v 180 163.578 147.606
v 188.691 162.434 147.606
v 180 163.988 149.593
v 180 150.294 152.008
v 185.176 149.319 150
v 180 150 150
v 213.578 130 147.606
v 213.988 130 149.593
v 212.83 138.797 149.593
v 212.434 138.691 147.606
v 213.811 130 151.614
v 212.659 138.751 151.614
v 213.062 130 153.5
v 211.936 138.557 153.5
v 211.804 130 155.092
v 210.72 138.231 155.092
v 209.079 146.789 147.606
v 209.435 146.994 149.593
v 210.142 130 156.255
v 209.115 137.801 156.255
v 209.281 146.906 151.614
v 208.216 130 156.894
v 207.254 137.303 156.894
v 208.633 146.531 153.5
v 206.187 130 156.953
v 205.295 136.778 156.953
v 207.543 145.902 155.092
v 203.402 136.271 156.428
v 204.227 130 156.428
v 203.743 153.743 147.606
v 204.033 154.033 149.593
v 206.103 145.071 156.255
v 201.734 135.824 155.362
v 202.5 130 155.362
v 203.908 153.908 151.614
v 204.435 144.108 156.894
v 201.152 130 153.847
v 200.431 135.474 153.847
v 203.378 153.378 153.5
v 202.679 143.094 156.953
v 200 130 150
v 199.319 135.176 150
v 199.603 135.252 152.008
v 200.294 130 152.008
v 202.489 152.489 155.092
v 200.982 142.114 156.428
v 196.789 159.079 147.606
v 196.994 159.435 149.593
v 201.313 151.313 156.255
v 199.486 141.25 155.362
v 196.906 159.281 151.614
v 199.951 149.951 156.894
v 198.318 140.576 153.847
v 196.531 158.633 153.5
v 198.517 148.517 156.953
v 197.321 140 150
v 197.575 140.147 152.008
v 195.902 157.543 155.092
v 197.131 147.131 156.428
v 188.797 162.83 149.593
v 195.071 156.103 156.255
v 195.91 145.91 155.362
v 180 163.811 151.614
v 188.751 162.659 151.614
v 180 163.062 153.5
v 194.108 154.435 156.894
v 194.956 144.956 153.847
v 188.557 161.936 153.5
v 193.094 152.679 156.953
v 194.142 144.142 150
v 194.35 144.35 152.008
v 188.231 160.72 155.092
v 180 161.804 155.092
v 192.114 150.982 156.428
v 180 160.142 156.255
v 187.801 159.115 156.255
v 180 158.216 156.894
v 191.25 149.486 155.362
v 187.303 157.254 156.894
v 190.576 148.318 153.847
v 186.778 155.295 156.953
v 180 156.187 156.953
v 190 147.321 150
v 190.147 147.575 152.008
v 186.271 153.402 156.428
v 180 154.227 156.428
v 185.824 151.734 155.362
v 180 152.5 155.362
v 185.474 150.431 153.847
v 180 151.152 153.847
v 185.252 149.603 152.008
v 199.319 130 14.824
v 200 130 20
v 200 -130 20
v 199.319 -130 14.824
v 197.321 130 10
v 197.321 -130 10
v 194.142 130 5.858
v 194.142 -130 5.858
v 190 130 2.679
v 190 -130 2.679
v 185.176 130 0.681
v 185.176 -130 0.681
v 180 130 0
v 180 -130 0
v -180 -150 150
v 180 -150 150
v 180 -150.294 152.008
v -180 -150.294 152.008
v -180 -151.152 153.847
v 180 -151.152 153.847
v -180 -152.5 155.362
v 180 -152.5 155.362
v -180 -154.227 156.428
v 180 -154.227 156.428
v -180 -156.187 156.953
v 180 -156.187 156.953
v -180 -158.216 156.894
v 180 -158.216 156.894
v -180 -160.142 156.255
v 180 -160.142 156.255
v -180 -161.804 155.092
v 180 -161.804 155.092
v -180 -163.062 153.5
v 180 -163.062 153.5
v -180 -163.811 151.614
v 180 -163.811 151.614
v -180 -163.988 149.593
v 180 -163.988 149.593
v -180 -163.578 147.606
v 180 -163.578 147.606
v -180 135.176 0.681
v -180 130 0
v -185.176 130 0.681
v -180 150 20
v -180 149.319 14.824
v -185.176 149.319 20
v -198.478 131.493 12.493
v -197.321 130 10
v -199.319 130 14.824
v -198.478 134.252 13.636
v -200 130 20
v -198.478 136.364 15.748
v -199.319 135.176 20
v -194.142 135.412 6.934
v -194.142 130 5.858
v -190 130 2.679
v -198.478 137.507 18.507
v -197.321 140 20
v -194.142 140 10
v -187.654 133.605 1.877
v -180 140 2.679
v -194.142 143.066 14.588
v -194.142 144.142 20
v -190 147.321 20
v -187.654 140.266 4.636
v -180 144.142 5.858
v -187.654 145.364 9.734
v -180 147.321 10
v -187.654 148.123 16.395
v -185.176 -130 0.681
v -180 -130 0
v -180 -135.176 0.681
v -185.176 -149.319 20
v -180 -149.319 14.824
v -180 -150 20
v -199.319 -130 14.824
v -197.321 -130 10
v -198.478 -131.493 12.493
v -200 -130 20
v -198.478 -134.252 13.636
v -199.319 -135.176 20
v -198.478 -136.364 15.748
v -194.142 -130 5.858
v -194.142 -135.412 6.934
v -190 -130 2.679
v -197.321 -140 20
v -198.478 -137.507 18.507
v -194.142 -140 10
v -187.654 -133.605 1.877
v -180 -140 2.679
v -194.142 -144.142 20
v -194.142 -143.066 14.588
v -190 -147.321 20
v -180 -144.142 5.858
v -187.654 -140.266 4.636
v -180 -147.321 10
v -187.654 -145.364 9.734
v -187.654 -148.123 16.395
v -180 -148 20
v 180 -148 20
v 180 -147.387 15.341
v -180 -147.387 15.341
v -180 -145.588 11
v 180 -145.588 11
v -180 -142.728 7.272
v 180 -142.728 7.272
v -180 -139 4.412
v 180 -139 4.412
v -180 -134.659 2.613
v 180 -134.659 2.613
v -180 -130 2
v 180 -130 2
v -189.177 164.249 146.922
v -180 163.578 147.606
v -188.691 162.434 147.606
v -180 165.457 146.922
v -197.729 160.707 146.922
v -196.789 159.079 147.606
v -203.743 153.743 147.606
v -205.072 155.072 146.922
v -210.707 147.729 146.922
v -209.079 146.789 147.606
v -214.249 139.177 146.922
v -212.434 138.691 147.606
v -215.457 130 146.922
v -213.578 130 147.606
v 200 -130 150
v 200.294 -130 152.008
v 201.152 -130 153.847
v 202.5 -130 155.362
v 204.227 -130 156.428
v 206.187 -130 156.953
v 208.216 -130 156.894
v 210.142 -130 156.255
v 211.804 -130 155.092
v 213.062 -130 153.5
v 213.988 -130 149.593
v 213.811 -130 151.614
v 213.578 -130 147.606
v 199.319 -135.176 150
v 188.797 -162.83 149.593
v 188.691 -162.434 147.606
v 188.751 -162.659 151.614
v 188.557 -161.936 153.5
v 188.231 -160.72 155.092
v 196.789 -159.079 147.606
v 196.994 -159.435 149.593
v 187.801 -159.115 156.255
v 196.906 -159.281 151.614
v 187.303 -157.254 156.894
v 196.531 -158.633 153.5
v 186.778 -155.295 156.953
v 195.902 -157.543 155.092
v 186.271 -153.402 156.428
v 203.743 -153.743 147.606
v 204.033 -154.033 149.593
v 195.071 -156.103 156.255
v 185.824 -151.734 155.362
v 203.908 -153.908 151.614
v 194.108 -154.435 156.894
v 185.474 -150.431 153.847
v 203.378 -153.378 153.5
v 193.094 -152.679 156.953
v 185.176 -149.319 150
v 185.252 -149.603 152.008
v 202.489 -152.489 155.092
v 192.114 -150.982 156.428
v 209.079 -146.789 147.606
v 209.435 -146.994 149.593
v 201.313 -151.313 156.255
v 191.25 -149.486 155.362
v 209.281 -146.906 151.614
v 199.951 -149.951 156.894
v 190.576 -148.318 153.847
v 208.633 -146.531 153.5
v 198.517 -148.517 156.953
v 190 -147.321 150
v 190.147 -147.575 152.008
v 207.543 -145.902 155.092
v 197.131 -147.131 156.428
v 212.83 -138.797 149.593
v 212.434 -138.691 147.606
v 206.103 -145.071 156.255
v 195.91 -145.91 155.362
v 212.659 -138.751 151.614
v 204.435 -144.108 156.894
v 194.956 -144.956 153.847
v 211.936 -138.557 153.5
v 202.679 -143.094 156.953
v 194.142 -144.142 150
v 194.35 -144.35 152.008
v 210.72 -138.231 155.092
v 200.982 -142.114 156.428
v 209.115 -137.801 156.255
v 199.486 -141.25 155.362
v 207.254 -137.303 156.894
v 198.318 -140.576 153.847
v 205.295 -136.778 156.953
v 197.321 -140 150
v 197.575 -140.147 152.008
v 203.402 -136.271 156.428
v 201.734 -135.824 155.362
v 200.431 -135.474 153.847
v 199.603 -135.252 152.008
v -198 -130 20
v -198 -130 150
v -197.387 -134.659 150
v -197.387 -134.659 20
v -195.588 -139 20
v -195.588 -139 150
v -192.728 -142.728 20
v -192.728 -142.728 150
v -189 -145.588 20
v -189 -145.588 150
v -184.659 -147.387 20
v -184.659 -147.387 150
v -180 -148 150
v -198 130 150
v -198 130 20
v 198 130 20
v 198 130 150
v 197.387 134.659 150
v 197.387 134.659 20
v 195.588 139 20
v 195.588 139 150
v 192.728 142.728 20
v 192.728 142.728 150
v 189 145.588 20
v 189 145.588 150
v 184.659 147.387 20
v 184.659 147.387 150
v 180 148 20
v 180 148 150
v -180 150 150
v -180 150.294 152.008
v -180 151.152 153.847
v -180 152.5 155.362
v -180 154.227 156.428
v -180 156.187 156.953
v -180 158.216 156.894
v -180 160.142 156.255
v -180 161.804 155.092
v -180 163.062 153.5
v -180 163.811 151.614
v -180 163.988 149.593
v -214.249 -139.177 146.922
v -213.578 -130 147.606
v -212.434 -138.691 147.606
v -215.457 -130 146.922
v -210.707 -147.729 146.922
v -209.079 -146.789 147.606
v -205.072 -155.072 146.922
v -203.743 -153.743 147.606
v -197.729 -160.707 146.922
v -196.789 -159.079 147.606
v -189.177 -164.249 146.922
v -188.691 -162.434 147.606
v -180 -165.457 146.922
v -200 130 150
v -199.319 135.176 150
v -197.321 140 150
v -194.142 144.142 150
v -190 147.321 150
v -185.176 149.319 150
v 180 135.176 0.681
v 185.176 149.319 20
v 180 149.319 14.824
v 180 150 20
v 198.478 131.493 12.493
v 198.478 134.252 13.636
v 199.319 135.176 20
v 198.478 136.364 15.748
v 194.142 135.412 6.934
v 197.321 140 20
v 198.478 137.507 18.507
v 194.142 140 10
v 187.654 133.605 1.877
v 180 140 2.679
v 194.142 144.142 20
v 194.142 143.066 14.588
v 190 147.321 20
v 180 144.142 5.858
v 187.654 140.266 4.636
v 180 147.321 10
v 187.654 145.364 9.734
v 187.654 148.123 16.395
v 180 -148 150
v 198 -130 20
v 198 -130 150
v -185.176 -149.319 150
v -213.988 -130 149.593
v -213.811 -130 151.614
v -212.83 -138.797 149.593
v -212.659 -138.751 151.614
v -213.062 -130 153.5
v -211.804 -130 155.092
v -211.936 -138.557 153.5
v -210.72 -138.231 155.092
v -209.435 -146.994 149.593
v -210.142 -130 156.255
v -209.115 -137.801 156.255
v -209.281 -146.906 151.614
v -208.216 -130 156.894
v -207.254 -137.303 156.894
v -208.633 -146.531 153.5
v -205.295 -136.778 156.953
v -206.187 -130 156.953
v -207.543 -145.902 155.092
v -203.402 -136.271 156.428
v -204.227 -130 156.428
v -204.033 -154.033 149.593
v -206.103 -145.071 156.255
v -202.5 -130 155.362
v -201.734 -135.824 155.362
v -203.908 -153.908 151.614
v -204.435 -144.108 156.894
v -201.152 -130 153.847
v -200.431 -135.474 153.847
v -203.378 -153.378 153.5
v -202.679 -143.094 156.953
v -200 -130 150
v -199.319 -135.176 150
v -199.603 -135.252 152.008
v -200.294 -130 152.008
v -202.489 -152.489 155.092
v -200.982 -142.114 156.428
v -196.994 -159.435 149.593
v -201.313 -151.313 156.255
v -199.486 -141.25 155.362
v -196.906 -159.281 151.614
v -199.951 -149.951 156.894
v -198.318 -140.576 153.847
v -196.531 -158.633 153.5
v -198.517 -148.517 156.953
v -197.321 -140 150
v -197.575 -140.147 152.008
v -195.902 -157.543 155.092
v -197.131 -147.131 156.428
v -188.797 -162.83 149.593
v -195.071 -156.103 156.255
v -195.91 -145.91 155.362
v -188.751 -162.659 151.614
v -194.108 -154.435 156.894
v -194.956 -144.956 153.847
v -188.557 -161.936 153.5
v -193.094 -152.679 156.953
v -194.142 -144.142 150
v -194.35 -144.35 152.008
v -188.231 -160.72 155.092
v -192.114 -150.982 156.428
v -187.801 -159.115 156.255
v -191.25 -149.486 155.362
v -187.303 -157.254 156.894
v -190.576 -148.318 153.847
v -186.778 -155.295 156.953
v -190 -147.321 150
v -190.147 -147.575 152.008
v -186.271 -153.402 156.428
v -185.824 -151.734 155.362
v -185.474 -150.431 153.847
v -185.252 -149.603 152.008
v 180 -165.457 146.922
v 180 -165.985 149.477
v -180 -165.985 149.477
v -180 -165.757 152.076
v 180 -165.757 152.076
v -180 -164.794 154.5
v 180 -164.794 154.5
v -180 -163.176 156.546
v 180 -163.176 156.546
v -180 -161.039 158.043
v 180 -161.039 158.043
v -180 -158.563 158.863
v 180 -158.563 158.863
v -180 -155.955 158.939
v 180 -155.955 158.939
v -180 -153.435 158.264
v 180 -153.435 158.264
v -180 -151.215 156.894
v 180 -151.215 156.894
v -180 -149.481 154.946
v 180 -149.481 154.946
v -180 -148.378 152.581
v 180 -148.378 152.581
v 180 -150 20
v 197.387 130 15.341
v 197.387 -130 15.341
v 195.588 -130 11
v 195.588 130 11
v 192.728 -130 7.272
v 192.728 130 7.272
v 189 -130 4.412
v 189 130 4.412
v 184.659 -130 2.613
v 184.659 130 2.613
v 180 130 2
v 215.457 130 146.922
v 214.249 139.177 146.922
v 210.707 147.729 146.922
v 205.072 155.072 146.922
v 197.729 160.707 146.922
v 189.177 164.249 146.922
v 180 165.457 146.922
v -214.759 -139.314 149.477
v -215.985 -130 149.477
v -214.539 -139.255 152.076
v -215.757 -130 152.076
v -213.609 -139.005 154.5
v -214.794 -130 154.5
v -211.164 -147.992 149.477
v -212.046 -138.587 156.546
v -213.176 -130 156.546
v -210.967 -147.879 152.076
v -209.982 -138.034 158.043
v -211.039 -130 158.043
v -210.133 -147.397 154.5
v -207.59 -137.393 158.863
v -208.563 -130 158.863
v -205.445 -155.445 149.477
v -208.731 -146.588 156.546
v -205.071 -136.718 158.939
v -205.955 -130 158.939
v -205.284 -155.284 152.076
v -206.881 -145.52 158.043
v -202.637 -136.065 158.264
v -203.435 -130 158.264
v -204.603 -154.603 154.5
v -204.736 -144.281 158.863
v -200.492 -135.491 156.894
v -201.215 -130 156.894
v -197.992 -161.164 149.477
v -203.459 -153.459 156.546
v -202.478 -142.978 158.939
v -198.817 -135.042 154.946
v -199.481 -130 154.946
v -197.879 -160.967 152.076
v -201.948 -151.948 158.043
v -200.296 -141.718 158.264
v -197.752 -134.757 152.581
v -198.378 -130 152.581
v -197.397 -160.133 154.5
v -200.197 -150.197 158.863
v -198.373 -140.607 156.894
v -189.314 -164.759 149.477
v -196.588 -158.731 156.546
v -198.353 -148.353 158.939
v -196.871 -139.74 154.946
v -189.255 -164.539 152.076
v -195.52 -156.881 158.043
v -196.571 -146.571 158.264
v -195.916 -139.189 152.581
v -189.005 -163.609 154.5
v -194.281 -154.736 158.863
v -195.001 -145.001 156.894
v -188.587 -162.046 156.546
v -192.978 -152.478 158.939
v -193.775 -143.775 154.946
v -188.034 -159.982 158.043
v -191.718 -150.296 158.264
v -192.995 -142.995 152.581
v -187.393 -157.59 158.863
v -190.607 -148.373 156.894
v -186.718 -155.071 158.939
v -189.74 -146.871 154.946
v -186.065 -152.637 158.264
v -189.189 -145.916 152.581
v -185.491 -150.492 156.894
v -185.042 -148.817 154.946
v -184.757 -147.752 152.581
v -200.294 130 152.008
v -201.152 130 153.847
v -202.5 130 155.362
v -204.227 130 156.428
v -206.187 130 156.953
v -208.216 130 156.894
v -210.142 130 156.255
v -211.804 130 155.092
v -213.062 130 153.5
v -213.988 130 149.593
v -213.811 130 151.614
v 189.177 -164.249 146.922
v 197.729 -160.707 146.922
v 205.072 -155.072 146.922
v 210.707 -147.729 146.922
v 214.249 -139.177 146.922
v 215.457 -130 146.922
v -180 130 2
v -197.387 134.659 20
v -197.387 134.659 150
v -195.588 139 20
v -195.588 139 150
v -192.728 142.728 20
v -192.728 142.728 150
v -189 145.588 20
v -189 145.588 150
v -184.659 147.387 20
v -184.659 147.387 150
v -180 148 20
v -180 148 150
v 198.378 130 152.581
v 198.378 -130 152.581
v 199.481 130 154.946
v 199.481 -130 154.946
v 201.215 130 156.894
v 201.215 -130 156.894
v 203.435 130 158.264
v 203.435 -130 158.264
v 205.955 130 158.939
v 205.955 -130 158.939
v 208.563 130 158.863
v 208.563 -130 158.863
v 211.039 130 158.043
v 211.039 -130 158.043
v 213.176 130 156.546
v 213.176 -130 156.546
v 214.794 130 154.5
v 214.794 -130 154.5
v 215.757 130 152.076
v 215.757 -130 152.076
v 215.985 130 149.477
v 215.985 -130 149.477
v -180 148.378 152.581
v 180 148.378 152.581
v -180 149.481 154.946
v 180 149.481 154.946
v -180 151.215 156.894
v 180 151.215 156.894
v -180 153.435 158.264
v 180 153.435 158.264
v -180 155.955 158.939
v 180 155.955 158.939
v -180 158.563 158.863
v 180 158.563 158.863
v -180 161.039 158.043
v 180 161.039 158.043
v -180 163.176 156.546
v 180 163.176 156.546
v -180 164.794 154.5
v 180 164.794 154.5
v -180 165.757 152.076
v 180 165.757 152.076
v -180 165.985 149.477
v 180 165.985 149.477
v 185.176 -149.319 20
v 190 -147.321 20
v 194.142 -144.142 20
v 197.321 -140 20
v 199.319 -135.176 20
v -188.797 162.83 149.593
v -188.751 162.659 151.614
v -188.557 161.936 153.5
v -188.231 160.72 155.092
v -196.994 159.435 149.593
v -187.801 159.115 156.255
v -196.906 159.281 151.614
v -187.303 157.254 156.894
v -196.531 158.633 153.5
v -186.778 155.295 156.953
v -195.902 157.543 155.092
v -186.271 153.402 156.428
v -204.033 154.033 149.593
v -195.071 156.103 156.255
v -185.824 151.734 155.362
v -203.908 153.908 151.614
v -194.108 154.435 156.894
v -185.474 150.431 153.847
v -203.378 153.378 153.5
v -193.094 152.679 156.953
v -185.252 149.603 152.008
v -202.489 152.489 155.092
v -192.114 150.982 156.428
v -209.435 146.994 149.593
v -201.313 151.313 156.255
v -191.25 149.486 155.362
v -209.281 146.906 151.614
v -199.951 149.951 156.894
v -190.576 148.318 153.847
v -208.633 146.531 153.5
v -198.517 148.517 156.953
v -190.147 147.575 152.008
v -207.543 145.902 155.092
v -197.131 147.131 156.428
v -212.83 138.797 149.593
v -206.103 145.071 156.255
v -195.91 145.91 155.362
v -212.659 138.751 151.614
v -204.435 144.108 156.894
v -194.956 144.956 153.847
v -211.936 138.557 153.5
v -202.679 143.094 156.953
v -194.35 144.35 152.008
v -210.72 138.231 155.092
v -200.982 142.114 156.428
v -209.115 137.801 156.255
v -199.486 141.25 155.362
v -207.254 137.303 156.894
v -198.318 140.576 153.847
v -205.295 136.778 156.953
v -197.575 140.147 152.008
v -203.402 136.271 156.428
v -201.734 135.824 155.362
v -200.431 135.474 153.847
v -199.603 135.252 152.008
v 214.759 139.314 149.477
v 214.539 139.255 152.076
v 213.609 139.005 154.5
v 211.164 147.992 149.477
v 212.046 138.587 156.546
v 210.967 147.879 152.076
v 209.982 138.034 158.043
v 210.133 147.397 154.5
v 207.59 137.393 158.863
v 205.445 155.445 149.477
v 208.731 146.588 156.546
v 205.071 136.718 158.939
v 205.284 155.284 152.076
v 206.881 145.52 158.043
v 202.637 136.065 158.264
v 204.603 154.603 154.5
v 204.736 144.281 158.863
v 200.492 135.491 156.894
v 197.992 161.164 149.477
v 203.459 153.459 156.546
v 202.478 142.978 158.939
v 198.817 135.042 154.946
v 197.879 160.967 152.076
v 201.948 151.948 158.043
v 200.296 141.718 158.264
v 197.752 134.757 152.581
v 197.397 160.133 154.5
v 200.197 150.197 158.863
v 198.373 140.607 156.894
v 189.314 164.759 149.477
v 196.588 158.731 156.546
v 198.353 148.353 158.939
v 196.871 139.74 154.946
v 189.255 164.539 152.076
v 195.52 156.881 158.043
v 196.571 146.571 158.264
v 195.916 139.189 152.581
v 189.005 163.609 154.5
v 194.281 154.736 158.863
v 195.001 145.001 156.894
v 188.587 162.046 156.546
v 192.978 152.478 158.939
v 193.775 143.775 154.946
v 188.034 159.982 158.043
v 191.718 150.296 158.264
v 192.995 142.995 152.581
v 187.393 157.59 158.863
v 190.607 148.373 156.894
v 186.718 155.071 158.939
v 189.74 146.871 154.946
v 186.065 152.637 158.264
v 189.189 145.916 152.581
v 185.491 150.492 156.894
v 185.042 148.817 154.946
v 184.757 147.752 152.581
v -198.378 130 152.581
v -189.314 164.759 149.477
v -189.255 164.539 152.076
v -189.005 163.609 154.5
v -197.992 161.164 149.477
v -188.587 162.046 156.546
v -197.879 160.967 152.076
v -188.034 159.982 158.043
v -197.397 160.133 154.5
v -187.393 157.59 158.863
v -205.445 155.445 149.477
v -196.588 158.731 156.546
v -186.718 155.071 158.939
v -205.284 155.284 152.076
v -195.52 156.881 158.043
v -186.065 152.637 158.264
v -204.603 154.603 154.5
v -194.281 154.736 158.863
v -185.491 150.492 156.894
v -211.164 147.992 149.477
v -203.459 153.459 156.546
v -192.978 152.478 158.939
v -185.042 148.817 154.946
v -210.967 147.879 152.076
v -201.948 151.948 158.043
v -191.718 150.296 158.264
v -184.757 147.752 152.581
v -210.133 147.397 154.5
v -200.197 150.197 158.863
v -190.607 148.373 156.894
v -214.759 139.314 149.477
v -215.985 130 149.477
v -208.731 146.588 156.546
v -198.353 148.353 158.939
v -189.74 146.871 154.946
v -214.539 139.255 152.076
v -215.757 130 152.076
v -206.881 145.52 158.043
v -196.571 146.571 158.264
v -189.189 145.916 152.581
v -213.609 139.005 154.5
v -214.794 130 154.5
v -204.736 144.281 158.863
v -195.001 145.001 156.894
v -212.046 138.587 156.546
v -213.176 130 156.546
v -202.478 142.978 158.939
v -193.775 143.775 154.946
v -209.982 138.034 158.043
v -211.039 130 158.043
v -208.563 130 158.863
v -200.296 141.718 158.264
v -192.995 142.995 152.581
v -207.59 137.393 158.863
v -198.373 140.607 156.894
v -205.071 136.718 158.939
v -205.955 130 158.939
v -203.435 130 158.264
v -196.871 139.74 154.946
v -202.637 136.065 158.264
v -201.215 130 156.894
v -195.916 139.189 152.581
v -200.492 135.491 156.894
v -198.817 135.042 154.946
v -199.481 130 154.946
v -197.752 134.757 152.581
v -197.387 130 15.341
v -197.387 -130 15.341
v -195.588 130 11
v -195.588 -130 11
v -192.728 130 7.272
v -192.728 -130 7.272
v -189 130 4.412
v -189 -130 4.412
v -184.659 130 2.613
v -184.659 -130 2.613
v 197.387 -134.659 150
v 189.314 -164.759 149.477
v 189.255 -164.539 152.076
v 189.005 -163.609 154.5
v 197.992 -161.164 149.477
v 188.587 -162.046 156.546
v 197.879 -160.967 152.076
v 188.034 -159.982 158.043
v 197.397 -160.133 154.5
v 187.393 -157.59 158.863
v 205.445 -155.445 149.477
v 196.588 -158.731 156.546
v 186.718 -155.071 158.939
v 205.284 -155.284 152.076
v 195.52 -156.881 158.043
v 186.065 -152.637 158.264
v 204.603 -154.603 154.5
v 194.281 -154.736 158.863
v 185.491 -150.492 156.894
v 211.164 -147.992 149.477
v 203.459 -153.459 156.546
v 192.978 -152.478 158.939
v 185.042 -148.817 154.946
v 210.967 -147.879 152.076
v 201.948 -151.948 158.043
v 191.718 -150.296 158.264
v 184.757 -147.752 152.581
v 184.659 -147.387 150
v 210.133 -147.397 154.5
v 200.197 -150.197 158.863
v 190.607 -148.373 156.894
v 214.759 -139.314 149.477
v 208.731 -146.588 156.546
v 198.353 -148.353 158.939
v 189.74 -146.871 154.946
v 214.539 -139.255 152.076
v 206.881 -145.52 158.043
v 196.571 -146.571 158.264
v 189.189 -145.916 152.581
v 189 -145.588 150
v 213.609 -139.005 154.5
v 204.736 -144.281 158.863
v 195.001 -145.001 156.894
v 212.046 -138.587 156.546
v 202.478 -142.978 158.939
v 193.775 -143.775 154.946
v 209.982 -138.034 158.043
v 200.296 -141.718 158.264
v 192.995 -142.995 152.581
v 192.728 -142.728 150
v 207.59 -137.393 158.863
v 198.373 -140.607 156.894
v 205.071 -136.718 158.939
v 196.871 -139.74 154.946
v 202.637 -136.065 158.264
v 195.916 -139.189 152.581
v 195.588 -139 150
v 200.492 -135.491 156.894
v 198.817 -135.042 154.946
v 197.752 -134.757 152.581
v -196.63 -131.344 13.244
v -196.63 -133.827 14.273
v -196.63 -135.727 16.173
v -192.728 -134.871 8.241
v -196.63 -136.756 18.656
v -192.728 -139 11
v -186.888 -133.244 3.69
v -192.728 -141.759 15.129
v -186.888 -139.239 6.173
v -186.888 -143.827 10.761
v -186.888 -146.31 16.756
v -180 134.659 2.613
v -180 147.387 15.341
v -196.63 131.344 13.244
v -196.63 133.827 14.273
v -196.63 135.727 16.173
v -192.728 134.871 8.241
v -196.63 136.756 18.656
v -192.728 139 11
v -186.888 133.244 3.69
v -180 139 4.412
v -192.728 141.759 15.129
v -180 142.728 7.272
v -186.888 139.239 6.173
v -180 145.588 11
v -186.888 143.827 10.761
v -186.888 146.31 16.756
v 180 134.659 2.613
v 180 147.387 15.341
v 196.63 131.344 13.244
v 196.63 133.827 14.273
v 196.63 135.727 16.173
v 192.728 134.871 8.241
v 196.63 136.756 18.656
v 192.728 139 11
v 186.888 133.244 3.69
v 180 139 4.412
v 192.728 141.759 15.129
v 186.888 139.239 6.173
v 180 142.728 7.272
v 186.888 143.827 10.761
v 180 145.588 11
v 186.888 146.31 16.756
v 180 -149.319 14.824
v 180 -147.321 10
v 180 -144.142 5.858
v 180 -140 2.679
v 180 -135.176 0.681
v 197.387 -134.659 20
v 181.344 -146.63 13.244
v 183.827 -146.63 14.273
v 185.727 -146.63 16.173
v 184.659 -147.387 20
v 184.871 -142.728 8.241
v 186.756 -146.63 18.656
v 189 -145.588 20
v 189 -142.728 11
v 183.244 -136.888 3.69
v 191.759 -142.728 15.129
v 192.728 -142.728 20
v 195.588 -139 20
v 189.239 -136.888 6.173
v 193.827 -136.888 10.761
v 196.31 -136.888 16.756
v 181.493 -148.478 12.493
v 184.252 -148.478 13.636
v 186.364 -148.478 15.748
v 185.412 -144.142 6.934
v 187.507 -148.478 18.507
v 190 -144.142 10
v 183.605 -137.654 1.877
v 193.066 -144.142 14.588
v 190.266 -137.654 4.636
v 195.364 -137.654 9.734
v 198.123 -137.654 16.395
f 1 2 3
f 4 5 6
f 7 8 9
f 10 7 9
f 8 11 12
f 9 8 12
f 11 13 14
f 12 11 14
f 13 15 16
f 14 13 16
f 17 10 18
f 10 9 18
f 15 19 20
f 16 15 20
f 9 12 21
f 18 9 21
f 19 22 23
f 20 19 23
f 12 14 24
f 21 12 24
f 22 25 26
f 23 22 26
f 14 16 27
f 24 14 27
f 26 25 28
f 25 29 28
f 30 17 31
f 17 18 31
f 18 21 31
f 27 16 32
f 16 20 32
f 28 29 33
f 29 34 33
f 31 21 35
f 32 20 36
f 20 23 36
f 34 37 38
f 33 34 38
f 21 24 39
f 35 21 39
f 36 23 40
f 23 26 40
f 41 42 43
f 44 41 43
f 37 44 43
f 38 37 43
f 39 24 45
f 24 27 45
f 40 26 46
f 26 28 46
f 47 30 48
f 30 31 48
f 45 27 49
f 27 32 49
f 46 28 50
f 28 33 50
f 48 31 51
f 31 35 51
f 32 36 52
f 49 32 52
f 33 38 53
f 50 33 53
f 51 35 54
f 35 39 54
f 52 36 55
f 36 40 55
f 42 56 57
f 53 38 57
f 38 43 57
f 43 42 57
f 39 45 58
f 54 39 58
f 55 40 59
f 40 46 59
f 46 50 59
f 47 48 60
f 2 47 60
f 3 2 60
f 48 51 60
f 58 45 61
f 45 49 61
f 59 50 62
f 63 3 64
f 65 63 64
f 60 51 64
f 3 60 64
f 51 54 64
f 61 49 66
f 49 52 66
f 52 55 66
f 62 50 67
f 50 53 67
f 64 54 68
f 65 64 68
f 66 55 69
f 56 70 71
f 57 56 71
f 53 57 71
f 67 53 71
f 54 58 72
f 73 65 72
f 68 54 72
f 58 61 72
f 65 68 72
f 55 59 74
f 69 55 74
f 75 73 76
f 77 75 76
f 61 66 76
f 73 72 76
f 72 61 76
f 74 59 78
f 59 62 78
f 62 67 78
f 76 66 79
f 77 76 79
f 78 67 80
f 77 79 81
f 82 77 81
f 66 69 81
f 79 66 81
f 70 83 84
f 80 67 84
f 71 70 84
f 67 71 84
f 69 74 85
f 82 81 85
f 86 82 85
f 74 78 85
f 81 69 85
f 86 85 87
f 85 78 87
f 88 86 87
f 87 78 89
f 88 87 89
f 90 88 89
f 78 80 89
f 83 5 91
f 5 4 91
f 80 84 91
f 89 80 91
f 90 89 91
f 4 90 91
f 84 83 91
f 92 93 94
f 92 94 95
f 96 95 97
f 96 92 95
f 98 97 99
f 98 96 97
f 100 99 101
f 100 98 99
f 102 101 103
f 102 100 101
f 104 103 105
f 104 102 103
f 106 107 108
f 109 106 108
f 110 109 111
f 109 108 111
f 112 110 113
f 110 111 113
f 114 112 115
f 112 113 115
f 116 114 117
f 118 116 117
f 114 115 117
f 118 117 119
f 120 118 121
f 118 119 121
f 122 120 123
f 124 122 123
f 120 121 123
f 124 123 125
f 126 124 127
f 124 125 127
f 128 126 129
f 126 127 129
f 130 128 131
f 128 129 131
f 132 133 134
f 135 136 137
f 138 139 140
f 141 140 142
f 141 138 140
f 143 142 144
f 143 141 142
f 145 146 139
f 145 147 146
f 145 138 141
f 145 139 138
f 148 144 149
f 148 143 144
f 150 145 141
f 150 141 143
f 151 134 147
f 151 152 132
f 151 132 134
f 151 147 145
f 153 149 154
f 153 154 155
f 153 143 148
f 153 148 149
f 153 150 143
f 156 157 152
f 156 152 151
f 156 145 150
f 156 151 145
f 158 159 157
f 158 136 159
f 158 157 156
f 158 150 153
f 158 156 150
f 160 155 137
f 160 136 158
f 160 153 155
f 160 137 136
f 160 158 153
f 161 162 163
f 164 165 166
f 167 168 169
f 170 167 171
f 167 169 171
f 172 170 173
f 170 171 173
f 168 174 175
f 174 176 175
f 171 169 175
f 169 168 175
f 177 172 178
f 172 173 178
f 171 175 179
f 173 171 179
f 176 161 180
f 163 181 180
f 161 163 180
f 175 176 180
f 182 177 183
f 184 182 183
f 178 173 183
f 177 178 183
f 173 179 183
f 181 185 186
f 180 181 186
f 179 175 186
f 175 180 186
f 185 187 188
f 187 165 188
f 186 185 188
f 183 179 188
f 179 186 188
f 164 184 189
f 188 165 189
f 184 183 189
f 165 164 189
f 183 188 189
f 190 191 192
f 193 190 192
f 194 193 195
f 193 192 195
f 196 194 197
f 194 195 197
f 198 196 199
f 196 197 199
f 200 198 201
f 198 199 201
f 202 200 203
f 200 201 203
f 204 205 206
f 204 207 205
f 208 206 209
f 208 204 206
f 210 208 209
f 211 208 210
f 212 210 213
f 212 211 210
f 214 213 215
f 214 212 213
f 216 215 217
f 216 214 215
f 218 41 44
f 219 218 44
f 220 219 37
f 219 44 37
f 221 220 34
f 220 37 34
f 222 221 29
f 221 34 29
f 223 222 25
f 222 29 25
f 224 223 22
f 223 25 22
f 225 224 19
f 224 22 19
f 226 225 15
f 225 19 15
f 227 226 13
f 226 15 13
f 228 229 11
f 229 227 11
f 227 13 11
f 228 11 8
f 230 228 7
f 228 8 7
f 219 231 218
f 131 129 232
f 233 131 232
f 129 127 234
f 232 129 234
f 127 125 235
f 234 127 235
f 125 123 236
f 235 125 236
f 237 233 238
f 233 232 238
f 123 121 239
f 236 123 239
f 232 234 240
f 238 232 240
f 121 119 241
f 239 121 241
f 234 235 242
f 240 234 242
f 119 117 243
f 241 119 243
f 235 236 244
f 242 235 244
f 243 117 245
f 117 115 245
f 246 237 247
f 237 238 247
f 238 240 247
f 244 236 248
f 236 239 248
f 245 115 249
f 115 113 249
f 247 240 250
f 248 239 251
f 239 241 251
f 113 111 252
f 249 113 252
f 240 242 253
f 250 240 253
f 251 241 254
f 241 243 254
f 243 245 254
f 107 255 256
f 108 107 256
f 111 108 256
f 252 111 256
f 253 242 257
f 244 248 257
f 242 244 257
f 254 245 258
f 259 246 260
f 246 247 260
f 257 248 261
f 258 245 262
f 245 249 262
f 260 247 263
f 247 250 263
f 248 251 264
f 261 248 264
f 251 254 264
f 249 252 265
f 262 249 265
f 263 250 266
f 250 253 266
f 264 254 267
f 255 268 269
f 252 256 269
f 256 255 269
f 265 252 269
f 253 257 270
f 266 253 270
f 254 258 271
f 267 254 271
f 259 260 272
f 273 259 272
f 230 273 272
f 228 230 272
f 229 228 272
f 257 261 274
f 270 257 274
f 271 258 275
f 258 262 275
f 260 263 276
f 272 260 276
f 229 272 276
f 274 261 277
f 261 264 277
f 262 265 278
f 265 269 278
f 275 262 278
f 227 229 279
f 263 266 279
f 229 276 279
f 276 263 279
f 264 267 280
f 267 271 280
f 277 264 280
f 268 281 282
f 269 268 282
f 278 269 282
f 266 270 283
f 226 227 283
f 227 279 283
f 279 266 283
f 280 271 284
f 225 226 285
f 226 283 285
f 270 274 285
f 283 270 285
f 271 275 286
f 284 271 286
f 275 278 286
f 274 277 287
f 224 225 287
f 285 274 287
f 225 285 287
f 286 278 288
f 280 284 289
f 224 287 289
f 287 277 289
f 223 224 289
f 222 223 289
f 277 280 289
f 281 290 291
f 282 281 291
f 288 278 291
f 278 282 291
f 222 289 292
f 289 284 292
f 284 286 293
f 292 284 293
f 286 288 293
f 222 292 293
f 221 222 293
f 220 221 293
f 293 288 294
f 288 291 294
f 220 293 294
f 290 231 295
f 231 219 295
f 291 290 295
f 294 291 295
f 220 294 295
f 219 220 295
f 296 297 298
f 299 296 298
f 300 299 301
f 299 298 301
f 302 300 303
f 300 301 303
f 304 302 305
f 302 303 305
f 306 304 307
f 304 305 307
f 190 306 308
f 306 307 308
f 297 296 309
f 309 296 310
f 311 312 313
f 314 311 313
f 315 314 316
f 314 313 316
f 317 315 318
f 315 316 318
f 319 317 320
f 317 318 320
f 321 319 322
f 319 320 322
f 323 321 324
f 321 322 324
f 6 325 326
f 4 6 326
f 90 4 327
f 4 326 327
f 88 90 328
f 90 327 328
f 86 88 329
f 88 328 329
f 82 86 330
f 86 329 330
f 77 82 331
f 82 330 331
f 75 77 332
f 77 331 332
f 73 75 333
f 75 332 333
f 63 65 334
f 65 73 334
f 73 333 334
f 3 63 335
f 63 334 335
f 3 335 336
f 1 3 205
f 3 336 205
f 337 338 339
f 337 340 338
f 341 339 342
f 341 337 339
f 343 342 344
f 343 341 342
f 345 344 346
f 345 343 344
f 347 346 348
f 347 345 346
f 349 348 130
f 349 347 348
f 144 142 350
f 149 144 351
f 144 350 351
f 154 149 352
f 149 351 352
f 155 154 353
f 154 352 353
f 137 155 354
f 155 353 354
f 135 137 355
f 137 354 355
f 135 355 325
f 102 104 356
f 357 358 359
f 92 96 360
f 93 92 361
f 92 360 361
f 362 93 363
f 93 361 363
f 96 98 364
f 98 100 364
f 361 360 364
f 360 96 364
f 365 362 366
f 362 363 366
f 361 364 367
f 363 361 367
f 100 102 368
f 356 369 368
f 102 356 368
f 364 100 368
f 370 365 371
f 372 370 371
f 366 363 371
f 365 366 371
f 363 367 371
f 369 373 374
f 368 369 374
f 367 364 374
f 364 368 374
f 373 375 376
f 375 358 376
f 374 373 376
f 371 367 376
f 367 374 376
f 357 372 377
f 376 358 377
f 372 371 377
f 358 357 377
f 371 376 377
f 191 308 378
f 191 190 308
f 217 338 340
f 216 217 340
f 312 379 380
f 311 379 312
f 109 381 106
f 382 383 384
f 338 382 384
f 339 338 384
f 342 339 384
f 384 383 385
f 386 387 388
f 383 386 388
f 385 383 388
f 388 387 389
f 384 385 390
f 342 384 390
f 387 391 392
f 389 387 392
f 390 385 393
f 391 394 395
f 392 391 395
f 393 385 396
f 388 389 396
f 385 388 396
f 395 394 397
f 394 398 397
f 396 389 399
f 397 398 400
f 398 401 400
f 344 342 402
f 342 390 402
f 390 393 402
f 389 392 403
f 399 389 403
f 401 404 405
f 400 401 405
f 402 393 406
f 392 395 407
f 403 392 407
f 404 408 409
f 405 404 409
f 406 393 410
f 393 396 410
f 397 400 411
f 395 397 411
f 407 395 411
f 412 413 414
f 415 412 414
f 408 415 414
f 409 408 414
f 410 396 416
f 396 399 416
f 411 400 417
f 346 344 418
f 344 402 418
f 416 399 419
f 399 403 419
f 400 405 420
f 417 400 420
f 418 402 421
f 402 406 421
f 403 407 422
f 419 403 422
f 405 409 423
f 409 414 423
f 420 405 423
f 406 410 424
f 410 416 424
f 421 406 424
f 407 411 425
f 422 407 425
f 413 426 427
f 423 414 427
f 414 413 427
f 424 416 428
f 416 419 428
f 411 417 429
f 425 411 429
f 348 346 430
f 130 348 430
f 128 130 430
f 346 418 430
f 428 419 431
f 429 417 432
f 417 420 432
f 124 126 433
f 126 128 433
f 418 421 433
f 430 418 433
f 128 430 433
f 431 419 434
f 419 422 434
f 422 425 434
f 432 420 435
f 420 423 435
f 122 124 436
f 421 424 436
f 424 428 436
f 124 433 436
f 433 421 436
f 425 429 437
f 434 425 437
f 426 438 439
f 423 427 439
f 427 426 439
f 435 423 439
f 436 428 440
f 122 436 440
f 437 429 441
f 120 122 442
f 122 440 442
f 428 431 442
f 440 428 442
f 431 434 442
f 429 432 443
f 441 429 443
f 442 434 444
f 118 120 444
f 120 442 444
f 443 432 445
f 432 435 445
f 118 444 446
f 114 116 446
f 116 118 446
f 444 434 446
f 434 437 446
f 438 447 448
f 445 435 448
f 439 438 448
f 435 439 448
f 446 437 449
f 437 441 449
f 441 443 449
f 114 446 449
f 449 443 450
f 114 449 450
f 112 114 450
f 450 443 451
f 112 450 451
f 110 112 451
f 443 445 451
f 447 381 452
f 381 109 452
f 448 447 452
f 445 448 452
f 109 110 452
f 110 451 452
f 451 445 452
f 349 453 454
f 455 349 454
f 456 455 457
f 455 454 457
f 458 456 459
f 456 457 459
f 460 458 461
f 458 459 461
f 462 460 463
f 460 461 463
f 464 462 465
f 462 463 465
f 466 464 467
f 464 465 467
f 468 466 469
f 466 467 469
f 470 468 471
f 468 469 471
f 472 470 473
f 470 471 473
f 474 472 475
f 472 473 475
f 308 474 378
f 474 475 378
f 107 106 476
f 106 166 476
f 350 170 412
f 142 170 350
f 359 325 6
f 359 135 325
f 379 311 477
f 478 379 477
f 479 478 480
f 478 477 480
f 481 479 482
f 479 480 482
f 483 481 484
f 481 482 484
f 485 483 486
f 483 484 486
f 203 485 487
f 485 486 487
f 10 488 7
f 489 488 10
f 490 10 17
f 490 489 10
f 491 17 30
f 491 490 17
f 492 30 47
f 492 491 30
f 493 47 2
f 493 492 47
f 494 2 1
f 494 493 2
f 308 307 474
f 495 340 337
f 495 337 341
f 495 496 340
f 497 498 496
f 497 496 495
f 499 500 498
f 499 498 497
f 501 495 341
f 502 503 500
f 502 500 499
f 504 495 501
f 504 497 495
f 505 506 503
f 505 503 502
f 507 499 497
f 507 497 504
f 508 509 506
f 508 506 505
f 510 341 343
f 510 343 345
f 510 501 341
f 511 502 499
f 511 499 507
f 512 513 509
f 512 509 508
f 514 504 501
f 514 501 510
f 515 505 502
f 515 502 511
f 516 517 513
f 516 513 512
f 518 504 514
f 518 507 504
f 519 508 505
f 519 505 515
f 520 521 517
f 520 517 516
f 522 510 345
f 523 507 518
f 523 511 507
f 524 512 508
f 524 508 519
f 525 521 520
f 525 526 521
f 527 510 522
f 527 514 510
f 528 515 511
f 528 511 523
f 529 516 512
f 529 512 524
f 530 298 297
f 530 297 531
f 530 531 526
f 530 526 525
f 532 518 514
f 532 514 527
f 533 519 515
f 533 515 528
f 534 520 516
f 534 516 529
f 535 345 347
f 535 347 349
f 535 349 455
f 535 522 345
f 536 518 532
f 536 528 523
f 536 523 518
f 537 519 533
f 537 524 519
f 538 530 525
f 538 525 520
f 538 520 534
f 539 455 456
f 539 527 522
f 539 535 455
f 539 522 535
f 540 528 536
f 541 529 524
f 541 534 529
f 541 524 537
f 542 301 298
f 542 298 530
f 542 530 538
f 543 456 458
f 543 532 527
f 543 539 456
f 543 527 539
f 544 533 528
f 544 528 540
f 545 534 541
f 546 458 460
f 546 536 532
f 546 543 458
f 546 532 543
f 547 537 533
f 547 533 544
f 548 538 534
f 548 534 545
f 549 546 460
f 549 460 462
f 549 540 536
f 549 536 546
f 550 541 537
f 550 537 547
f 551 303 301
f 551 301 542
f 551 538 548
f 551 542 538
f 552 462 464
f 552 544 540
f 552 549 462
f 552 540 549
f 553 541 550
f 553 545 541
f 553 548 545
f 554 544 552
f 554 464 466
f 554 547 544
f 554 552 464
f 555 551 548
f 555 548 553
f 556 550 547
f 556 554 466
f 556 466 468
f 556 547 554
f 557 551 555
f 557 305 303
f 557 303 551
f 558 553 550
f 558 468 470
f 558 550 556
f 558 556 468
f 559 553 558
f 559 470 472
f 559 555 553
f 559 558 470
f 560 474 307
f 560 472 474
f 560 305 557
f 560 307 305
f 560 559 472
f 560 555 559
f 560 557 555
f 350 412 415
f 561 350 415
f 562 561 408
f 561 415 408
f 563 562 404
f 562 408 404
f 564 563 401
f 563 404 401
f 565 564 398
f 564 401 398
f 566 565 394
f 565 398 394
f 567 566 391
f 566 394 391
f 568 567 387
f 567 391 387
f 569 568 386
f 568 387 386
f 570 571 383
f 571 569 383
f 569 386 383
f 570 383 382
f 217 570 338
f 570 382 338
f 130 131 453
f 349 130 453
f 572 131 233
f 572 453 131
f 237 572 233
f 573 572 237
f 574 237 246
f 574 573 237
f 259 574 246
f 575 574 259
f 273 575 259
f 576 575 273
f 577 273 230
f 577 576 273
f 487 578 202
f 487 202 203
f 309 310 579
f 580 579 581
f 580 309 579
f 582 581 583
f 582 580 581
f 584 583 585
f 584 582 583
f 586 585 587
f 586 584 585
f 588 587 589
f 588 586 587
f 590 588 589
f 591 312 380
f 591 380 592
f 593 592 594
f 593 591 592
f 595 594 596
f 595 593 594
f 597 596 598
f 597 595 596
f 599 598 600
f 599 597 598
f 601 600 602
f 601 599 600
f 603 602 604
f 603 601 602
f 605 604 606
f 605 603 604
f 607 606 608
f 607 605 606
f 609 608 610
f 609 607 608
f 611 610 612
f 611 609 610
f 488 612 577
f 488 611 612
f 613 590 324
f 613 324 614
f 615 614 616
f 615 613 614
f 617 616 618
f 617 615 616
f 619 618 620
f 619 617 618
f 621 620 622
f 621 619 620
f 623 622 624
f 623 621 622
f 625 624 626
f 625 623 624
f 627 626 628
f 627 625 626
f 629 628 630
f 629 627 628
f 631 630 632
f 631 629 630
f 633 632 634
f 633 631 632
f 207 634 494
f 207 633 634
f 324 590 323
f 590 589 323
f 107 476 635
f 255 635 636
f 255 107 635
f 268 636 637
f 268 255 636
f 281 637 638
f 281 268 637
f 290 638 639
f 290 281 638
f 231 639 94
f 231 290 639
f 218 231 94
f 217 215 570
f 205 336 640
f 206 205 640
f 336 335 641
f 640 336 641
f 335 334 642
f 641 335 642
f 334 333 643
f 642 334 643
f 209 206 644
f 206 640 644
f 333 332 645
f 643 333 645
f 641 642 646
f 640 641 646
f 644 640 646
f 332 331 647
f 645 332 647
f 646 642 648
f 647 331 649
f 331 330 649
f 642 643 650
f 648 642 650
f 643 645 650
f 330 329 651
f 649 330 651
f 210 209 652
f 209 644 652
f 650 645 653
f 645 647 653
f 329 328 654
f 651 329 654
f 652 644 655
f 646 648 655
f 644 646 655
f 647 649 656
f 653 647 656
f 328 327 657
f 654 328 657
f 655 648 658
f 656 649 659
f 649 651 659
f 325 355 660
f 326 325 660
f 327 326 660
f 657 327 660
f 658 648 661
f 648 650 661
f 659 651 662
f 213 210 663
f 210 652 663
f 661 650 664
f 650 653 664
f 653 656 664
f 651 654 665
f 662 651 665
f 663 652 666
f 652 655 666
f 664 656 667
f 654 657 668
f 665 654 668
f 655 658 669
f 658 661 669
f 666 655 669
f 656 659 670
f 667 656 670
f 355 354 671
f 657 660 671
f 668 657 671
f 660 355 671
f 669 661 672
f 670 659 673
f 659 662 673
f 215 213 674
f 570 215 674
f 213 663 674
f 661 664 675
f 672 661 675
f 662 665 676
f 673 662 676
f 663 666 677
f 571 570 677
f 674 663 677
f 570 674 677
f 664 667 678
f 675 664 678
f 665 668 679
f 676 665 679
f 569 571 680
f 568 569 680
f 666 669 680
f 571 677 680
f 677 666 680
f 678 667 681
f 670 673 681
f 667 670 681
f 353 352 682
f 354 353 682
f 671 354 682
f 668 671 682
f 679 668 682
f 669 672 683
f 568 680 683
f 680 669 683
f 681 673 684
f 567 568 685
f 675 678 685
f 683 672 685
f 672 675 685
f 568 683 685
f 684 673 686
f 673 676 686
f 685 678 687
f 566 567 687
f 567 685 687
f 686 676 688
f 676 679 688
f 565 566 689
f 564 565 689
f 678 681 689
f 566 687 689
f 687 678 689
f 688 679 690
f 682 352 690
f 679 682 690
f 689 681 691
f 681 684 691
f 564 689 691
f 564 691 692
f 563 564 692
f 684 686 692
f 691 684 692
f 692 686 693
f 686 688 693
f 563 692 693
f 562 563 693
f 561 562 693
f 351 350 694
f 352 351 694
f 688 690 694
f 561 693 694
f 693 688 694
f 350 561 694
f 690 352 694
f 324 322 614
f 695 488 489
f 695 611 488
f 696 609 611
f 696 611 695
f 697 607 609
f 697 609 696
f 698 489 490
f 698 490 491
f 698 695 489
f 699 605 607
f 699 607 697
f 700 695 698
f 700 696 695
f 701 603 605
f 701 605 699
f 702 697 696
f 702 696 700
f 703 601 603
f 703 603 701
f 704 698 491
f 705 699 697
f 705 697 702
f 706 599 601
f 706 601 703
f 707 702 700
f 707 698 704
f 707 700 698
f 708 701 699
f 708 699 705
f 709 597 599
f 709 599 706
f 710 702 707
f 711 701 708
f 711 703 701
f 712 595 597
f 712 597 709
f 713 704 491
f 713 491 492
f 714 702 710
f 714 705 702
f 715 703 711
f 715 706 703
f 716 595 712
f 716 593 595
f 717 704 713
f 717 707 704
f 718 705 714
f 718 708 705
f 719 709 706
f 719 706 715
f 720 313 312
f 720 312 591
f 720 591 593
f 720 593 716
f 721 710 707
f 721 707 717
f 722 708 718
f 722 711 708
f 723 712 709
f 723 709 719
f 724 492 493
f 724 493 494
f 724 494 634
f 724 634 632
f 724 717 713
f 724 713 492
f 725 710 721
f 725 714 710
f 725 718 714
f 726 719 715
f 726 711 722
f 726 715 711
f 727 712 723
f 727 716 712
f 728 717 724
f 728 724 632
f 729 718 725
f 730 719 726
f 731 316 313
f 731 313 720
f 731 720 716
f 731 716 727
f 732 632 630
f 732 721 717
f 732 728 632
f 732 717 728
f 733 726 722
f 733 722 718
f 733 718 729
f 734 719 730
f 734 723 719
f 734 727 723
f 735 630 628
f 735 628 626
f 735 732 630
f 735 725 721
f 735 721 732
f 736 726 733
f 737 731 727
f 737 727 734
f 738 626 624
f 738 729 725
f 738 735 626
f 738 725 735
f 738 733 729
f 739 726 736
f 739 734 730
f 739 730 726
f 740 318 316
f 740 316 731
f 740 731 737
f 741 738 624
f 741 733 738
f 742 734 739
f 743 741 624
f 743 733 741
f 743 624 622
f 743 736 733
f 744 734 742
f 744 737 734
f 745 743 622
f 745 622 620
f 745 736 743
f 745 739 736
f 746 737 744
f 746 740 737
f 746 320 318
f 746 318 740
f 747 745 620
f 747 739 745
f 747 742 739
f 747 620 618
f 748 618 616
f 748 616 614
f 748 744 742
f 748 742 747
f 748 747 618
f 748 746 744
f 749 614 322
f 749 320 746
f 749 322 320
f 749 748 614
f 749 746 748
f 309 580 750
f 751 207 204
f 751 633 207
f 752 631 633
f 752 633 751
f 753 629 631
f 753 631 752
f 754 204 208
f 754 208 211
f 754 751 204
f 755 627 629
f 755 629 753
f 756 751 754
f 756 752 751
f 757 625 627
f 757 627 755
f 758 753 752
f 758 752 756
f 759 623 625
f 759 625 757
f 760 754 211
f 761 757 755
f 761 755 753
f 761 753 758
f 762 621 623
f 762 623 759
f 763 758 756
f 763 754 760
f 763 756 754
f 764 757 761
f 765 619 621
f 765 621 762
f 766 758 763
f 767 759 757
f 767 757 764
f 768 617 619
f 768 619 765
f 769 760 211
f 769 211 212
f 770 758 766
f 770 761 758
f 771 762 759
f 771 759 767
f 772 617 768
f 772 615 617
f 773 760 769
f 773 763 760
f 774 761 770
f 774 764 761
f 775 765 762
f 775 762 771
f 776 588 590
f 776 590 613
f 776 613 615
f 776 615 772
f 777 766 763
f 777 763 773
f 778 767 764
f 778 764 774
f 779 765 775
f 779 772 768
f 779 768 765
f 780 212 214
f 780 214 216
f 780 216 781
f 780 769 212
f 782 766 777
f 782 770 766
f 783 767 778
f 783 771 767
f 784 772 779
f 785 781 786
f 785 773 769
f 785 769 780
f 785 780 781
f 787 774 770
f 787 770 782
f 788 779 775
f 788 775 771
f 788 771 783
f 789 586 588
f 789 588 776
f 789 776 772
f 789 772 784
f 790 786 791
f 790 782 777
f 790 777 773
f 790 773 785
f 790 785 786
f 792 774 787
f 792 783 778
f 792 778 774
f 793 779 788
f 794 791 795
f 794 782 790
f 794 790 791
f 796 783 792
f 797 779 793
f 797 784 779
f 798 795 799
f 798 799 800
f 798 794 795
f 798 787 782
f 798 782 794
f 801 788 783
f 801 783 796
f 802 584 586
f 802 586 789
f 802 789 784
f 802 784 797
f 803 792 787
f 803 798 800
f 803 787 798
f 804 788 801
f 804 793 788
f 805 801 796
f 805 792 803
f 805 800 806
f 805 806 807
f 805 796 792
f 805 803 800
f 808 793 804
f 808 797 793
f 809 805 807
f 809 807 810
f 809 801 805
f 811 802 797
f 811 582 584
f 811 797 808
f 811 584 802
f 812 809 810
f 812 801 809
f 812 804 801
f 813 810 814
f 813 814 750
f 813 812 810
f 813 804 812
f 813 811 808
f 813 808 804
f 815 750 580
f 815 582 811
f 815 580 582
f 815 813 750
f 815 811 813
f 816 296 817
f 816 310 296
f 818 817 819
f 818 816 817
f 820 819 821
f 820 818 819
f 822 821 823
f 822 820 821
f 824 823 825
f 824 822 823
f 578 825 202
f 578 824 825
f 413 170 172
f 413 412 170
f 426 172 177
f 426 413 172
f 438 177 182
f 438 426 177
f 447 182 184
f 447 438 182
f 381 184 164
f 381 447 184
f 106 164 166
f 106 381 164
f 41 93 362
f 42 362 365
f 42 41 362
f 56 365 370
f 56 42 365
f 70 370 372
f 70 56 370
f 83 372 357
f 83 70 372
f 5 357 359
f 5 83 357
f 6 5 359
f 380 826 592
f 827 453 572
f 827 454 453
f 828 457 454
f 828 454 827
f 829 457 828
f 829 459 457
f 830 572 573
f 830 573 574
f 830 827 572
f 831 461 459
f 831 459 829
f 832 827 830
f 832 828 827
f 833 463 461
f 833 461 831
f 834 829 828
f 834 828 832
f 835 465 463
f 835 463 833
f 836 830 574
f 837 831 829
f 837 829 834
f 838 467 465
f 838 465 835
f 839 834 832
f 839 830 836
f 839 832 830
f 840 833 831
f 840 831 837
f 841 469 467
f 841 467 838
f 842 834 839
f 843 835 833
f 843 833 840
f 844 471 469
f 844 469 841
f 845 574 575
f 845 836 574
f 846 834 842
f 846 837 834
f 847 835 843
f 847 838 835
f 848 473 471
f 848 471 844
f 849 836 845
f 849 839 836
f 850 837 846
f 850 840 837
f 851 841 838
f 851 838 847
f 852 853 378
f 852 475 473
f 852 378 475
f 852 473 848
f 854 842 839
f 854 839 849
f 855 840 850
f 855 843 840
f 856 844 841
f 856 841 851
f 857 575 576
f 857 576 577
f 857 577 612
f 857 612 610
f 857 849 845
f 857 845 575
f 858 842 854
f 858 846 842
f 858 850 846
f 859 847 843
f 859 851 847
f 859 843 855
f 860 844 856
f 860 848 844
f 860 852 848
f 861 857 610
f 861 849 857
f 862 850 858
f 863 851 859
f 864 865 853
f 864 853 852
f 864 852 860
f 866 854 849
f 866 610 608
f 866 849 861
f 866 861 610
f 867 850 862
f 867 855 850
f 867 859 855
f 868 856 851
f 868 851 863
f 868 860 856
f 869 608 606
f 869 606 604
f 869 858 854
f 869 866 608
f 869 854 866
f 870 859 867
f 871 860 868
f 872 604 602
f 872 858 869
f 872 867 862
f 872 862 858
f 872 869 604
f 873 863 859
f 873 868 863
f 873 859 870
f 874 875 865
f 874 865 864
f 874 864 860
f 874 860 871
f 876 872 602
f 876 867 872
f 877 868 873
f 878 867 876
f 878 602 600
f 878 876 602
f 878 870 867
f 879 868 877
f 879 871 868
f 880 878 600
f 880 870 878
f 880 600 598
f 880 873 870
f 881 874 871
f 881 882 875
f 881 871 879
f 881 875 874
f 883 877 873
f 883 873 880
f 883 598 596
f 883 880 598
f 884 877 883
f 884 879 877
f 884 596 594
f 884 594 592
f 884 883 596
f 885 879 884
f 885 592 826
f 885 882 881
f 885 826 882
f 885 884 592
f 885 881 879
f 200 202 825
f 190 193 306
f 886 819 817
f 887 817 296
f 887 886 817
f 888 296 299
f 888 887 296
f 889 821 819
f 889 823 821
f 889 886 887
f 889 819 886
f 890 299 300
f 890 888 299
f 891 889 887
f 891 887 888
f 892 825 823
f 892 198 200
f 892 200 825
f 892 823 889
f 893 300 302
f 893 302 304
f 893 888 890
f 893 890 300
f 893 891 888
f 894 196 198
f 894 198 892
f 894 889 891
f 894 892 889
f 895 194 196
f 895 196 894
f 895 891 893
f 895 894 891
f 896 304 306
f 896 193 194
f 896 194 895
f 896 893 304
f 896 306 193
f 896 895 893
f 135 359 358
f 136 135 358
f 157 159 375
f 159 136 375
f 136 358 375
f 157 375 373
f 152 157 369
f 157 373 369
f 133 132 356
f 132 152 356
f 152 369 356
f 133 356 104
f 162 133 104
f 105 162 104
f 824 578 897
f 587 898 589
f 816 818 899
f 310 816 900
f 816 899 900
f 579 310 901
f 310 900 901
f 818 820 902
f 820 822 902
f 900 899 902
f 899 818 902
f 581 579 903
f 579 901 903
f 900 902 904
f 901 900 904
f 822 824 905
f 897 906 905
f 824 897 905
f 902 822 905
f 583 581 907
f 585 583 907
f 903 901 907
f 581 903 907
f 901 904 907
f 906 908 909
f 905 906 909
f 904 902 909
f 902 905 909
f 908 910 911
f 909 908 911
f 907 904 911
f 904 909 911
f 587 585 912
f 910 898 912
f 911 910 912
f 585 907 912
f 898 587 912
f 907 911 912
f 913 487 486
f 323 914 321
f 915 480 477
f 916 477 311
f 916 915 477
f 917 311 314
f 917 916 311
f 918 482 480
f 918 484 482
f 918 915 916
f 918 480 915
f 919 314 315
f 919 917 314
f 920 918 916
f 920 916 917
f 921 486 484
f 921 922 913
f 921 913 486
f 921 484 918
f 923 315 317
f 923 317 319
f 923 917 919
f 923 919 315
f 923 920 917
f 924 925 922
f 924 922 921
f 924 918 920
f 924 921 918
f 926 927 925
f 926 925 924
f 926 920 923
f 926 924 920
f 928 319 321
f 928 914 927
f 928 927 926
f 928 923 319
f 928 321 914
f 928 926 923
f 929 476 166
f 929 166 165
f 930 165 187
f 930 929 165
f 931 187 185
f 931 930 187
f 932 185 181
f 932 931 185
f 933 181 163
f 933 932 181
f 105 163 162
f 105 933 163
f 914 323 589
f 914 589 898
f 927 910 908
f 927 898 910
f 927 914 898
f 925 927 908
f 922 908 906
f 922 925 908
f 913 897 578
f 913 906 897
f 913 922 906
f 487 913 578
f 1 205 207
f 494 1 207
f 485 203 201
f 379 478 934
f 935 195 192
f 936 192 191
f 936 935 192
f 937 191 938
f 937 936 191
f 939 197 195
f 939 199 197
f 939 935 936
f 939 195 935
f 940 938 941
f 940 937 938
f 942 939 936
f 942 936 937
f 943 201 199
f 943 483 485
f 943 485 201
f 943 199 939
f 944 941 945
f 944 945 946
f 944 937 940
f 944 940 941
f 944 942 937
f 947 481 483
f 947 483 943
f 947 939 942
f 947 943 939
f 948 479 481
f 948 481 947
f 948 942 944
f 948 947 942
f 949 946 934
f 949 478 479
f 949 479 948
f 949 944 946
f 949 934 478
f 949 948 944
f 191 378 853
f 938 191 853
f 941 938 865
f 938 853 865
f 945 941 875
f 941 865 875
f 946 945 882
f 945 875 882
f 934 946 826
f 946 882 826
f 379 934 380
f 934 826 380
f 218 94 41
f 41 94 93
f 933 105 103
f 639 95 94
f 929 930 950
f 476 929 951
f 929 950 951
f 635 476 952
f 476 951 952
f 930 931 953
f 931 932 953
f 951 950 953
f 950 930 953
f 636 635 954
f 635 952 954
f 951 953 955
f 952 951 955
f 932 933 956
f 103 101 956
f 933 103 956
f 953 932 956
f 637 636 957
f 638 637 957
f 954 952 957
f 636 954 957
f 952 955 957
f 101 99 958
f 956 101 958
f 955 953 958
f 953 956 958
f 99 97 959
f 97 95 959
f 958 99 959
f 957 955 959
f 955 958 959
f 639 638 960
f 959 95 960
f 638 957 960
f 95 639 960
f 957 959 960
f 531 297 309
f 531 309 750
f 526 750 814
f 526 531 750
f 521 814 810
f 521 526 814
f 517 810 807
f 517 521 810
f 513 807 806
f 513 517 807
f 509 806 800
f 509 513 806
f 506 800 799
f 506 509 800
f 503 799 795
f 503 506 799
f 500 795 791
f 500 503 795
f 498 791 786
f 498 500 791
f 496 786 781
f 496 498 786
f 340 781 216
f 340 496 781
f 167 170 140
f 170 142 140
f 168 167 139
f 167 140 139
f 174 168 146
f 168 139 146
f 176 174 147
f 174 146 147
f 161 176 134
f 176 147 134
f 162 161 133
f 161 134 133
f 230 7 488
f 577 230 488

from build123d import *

# Parameters (mm, degrees)
SKETCH1_W           = 400
SKETCH1_H           = 300
BOSS_EXTRUDE1_DEPTH = 150
FILLET1_R           = 20
SHELL1_T            = -2


with BuildPart() as part:
    # Sketch1 → Boss-Extrude1 (new body)
    with BuildSketch(Plane.XY):
        Rectangle(SKETCH1_W, SKETCH1_H)
    extrude(amount=BOSS_EXTRUDE1_DEPTH)

    # Fillet1
    fillet1_edges = [part.edges().sort_by_distance(p)[0] for p in [
        (0, 150, 0),
        (200, 0, 0),
        (0, -150, 0),
        (-200, 0, 0),
        (-200, 150, 75),
        (200, 150, 75),
        (200, -150, 75),
        (-200, -150, 75),
    ]]
    fillet(fillet1_edges, radius=FILLET1_R)

    # Shell1
    shell1_openings = [part.faces().sort_by_distance(p)[0] for p in [
        (0, 0, 150),
    ]]
    offset(amount=SHELL1_T, openings=shell1_openings, kind=Kind.INTERSECTION)

    # Sweep2: sweep along a path in Sketch3
    with BuildLine(Plane.XY.offset(150)) as sweep2_path:
        Line((-180, -148), (180, -148))
        ThreePointArc((180, -148), (192.727922061, -142.727922061), (198, -130))
        Line((198, -130), (198, 130))
        ThreePointArc((198, 130), (192.727922061, 142.727922061), (180, 148))
        Line((180, 148), (-180, 148))
        ThreePointArc((-180, 148), (-192.727922061, 142.727922061), (-198, 130))
        Line((-198, 130), (-198, -130))
        ThreePointArc((-198, -130), (-192.727922061, -142.727922061), (-180, -148))
    # Sketch2 → Sweep2 (sweep)
    with BuildSketch(Plane(origin=(0, 0, 0), x_dir=(1, 0, 0), z_dir=(0, 1, 0))):
        with BuildLine():
            Line((-198, -150), (-200, -150))
            ThreePointArc((-200, -150), (-208.215537244, -156.893654271), (-213.577848346, -147.605858997))
            Line((-213.577848346, -147.605858997), (-215.457233587, -146.92181871))
            ThreePointArc((-215.457233587, -146.92181871), (-208.562833599, -158.863269777), (-198, -150))
        make_face()
    sweep(path=sweep2_path.line)


solid = part.part
